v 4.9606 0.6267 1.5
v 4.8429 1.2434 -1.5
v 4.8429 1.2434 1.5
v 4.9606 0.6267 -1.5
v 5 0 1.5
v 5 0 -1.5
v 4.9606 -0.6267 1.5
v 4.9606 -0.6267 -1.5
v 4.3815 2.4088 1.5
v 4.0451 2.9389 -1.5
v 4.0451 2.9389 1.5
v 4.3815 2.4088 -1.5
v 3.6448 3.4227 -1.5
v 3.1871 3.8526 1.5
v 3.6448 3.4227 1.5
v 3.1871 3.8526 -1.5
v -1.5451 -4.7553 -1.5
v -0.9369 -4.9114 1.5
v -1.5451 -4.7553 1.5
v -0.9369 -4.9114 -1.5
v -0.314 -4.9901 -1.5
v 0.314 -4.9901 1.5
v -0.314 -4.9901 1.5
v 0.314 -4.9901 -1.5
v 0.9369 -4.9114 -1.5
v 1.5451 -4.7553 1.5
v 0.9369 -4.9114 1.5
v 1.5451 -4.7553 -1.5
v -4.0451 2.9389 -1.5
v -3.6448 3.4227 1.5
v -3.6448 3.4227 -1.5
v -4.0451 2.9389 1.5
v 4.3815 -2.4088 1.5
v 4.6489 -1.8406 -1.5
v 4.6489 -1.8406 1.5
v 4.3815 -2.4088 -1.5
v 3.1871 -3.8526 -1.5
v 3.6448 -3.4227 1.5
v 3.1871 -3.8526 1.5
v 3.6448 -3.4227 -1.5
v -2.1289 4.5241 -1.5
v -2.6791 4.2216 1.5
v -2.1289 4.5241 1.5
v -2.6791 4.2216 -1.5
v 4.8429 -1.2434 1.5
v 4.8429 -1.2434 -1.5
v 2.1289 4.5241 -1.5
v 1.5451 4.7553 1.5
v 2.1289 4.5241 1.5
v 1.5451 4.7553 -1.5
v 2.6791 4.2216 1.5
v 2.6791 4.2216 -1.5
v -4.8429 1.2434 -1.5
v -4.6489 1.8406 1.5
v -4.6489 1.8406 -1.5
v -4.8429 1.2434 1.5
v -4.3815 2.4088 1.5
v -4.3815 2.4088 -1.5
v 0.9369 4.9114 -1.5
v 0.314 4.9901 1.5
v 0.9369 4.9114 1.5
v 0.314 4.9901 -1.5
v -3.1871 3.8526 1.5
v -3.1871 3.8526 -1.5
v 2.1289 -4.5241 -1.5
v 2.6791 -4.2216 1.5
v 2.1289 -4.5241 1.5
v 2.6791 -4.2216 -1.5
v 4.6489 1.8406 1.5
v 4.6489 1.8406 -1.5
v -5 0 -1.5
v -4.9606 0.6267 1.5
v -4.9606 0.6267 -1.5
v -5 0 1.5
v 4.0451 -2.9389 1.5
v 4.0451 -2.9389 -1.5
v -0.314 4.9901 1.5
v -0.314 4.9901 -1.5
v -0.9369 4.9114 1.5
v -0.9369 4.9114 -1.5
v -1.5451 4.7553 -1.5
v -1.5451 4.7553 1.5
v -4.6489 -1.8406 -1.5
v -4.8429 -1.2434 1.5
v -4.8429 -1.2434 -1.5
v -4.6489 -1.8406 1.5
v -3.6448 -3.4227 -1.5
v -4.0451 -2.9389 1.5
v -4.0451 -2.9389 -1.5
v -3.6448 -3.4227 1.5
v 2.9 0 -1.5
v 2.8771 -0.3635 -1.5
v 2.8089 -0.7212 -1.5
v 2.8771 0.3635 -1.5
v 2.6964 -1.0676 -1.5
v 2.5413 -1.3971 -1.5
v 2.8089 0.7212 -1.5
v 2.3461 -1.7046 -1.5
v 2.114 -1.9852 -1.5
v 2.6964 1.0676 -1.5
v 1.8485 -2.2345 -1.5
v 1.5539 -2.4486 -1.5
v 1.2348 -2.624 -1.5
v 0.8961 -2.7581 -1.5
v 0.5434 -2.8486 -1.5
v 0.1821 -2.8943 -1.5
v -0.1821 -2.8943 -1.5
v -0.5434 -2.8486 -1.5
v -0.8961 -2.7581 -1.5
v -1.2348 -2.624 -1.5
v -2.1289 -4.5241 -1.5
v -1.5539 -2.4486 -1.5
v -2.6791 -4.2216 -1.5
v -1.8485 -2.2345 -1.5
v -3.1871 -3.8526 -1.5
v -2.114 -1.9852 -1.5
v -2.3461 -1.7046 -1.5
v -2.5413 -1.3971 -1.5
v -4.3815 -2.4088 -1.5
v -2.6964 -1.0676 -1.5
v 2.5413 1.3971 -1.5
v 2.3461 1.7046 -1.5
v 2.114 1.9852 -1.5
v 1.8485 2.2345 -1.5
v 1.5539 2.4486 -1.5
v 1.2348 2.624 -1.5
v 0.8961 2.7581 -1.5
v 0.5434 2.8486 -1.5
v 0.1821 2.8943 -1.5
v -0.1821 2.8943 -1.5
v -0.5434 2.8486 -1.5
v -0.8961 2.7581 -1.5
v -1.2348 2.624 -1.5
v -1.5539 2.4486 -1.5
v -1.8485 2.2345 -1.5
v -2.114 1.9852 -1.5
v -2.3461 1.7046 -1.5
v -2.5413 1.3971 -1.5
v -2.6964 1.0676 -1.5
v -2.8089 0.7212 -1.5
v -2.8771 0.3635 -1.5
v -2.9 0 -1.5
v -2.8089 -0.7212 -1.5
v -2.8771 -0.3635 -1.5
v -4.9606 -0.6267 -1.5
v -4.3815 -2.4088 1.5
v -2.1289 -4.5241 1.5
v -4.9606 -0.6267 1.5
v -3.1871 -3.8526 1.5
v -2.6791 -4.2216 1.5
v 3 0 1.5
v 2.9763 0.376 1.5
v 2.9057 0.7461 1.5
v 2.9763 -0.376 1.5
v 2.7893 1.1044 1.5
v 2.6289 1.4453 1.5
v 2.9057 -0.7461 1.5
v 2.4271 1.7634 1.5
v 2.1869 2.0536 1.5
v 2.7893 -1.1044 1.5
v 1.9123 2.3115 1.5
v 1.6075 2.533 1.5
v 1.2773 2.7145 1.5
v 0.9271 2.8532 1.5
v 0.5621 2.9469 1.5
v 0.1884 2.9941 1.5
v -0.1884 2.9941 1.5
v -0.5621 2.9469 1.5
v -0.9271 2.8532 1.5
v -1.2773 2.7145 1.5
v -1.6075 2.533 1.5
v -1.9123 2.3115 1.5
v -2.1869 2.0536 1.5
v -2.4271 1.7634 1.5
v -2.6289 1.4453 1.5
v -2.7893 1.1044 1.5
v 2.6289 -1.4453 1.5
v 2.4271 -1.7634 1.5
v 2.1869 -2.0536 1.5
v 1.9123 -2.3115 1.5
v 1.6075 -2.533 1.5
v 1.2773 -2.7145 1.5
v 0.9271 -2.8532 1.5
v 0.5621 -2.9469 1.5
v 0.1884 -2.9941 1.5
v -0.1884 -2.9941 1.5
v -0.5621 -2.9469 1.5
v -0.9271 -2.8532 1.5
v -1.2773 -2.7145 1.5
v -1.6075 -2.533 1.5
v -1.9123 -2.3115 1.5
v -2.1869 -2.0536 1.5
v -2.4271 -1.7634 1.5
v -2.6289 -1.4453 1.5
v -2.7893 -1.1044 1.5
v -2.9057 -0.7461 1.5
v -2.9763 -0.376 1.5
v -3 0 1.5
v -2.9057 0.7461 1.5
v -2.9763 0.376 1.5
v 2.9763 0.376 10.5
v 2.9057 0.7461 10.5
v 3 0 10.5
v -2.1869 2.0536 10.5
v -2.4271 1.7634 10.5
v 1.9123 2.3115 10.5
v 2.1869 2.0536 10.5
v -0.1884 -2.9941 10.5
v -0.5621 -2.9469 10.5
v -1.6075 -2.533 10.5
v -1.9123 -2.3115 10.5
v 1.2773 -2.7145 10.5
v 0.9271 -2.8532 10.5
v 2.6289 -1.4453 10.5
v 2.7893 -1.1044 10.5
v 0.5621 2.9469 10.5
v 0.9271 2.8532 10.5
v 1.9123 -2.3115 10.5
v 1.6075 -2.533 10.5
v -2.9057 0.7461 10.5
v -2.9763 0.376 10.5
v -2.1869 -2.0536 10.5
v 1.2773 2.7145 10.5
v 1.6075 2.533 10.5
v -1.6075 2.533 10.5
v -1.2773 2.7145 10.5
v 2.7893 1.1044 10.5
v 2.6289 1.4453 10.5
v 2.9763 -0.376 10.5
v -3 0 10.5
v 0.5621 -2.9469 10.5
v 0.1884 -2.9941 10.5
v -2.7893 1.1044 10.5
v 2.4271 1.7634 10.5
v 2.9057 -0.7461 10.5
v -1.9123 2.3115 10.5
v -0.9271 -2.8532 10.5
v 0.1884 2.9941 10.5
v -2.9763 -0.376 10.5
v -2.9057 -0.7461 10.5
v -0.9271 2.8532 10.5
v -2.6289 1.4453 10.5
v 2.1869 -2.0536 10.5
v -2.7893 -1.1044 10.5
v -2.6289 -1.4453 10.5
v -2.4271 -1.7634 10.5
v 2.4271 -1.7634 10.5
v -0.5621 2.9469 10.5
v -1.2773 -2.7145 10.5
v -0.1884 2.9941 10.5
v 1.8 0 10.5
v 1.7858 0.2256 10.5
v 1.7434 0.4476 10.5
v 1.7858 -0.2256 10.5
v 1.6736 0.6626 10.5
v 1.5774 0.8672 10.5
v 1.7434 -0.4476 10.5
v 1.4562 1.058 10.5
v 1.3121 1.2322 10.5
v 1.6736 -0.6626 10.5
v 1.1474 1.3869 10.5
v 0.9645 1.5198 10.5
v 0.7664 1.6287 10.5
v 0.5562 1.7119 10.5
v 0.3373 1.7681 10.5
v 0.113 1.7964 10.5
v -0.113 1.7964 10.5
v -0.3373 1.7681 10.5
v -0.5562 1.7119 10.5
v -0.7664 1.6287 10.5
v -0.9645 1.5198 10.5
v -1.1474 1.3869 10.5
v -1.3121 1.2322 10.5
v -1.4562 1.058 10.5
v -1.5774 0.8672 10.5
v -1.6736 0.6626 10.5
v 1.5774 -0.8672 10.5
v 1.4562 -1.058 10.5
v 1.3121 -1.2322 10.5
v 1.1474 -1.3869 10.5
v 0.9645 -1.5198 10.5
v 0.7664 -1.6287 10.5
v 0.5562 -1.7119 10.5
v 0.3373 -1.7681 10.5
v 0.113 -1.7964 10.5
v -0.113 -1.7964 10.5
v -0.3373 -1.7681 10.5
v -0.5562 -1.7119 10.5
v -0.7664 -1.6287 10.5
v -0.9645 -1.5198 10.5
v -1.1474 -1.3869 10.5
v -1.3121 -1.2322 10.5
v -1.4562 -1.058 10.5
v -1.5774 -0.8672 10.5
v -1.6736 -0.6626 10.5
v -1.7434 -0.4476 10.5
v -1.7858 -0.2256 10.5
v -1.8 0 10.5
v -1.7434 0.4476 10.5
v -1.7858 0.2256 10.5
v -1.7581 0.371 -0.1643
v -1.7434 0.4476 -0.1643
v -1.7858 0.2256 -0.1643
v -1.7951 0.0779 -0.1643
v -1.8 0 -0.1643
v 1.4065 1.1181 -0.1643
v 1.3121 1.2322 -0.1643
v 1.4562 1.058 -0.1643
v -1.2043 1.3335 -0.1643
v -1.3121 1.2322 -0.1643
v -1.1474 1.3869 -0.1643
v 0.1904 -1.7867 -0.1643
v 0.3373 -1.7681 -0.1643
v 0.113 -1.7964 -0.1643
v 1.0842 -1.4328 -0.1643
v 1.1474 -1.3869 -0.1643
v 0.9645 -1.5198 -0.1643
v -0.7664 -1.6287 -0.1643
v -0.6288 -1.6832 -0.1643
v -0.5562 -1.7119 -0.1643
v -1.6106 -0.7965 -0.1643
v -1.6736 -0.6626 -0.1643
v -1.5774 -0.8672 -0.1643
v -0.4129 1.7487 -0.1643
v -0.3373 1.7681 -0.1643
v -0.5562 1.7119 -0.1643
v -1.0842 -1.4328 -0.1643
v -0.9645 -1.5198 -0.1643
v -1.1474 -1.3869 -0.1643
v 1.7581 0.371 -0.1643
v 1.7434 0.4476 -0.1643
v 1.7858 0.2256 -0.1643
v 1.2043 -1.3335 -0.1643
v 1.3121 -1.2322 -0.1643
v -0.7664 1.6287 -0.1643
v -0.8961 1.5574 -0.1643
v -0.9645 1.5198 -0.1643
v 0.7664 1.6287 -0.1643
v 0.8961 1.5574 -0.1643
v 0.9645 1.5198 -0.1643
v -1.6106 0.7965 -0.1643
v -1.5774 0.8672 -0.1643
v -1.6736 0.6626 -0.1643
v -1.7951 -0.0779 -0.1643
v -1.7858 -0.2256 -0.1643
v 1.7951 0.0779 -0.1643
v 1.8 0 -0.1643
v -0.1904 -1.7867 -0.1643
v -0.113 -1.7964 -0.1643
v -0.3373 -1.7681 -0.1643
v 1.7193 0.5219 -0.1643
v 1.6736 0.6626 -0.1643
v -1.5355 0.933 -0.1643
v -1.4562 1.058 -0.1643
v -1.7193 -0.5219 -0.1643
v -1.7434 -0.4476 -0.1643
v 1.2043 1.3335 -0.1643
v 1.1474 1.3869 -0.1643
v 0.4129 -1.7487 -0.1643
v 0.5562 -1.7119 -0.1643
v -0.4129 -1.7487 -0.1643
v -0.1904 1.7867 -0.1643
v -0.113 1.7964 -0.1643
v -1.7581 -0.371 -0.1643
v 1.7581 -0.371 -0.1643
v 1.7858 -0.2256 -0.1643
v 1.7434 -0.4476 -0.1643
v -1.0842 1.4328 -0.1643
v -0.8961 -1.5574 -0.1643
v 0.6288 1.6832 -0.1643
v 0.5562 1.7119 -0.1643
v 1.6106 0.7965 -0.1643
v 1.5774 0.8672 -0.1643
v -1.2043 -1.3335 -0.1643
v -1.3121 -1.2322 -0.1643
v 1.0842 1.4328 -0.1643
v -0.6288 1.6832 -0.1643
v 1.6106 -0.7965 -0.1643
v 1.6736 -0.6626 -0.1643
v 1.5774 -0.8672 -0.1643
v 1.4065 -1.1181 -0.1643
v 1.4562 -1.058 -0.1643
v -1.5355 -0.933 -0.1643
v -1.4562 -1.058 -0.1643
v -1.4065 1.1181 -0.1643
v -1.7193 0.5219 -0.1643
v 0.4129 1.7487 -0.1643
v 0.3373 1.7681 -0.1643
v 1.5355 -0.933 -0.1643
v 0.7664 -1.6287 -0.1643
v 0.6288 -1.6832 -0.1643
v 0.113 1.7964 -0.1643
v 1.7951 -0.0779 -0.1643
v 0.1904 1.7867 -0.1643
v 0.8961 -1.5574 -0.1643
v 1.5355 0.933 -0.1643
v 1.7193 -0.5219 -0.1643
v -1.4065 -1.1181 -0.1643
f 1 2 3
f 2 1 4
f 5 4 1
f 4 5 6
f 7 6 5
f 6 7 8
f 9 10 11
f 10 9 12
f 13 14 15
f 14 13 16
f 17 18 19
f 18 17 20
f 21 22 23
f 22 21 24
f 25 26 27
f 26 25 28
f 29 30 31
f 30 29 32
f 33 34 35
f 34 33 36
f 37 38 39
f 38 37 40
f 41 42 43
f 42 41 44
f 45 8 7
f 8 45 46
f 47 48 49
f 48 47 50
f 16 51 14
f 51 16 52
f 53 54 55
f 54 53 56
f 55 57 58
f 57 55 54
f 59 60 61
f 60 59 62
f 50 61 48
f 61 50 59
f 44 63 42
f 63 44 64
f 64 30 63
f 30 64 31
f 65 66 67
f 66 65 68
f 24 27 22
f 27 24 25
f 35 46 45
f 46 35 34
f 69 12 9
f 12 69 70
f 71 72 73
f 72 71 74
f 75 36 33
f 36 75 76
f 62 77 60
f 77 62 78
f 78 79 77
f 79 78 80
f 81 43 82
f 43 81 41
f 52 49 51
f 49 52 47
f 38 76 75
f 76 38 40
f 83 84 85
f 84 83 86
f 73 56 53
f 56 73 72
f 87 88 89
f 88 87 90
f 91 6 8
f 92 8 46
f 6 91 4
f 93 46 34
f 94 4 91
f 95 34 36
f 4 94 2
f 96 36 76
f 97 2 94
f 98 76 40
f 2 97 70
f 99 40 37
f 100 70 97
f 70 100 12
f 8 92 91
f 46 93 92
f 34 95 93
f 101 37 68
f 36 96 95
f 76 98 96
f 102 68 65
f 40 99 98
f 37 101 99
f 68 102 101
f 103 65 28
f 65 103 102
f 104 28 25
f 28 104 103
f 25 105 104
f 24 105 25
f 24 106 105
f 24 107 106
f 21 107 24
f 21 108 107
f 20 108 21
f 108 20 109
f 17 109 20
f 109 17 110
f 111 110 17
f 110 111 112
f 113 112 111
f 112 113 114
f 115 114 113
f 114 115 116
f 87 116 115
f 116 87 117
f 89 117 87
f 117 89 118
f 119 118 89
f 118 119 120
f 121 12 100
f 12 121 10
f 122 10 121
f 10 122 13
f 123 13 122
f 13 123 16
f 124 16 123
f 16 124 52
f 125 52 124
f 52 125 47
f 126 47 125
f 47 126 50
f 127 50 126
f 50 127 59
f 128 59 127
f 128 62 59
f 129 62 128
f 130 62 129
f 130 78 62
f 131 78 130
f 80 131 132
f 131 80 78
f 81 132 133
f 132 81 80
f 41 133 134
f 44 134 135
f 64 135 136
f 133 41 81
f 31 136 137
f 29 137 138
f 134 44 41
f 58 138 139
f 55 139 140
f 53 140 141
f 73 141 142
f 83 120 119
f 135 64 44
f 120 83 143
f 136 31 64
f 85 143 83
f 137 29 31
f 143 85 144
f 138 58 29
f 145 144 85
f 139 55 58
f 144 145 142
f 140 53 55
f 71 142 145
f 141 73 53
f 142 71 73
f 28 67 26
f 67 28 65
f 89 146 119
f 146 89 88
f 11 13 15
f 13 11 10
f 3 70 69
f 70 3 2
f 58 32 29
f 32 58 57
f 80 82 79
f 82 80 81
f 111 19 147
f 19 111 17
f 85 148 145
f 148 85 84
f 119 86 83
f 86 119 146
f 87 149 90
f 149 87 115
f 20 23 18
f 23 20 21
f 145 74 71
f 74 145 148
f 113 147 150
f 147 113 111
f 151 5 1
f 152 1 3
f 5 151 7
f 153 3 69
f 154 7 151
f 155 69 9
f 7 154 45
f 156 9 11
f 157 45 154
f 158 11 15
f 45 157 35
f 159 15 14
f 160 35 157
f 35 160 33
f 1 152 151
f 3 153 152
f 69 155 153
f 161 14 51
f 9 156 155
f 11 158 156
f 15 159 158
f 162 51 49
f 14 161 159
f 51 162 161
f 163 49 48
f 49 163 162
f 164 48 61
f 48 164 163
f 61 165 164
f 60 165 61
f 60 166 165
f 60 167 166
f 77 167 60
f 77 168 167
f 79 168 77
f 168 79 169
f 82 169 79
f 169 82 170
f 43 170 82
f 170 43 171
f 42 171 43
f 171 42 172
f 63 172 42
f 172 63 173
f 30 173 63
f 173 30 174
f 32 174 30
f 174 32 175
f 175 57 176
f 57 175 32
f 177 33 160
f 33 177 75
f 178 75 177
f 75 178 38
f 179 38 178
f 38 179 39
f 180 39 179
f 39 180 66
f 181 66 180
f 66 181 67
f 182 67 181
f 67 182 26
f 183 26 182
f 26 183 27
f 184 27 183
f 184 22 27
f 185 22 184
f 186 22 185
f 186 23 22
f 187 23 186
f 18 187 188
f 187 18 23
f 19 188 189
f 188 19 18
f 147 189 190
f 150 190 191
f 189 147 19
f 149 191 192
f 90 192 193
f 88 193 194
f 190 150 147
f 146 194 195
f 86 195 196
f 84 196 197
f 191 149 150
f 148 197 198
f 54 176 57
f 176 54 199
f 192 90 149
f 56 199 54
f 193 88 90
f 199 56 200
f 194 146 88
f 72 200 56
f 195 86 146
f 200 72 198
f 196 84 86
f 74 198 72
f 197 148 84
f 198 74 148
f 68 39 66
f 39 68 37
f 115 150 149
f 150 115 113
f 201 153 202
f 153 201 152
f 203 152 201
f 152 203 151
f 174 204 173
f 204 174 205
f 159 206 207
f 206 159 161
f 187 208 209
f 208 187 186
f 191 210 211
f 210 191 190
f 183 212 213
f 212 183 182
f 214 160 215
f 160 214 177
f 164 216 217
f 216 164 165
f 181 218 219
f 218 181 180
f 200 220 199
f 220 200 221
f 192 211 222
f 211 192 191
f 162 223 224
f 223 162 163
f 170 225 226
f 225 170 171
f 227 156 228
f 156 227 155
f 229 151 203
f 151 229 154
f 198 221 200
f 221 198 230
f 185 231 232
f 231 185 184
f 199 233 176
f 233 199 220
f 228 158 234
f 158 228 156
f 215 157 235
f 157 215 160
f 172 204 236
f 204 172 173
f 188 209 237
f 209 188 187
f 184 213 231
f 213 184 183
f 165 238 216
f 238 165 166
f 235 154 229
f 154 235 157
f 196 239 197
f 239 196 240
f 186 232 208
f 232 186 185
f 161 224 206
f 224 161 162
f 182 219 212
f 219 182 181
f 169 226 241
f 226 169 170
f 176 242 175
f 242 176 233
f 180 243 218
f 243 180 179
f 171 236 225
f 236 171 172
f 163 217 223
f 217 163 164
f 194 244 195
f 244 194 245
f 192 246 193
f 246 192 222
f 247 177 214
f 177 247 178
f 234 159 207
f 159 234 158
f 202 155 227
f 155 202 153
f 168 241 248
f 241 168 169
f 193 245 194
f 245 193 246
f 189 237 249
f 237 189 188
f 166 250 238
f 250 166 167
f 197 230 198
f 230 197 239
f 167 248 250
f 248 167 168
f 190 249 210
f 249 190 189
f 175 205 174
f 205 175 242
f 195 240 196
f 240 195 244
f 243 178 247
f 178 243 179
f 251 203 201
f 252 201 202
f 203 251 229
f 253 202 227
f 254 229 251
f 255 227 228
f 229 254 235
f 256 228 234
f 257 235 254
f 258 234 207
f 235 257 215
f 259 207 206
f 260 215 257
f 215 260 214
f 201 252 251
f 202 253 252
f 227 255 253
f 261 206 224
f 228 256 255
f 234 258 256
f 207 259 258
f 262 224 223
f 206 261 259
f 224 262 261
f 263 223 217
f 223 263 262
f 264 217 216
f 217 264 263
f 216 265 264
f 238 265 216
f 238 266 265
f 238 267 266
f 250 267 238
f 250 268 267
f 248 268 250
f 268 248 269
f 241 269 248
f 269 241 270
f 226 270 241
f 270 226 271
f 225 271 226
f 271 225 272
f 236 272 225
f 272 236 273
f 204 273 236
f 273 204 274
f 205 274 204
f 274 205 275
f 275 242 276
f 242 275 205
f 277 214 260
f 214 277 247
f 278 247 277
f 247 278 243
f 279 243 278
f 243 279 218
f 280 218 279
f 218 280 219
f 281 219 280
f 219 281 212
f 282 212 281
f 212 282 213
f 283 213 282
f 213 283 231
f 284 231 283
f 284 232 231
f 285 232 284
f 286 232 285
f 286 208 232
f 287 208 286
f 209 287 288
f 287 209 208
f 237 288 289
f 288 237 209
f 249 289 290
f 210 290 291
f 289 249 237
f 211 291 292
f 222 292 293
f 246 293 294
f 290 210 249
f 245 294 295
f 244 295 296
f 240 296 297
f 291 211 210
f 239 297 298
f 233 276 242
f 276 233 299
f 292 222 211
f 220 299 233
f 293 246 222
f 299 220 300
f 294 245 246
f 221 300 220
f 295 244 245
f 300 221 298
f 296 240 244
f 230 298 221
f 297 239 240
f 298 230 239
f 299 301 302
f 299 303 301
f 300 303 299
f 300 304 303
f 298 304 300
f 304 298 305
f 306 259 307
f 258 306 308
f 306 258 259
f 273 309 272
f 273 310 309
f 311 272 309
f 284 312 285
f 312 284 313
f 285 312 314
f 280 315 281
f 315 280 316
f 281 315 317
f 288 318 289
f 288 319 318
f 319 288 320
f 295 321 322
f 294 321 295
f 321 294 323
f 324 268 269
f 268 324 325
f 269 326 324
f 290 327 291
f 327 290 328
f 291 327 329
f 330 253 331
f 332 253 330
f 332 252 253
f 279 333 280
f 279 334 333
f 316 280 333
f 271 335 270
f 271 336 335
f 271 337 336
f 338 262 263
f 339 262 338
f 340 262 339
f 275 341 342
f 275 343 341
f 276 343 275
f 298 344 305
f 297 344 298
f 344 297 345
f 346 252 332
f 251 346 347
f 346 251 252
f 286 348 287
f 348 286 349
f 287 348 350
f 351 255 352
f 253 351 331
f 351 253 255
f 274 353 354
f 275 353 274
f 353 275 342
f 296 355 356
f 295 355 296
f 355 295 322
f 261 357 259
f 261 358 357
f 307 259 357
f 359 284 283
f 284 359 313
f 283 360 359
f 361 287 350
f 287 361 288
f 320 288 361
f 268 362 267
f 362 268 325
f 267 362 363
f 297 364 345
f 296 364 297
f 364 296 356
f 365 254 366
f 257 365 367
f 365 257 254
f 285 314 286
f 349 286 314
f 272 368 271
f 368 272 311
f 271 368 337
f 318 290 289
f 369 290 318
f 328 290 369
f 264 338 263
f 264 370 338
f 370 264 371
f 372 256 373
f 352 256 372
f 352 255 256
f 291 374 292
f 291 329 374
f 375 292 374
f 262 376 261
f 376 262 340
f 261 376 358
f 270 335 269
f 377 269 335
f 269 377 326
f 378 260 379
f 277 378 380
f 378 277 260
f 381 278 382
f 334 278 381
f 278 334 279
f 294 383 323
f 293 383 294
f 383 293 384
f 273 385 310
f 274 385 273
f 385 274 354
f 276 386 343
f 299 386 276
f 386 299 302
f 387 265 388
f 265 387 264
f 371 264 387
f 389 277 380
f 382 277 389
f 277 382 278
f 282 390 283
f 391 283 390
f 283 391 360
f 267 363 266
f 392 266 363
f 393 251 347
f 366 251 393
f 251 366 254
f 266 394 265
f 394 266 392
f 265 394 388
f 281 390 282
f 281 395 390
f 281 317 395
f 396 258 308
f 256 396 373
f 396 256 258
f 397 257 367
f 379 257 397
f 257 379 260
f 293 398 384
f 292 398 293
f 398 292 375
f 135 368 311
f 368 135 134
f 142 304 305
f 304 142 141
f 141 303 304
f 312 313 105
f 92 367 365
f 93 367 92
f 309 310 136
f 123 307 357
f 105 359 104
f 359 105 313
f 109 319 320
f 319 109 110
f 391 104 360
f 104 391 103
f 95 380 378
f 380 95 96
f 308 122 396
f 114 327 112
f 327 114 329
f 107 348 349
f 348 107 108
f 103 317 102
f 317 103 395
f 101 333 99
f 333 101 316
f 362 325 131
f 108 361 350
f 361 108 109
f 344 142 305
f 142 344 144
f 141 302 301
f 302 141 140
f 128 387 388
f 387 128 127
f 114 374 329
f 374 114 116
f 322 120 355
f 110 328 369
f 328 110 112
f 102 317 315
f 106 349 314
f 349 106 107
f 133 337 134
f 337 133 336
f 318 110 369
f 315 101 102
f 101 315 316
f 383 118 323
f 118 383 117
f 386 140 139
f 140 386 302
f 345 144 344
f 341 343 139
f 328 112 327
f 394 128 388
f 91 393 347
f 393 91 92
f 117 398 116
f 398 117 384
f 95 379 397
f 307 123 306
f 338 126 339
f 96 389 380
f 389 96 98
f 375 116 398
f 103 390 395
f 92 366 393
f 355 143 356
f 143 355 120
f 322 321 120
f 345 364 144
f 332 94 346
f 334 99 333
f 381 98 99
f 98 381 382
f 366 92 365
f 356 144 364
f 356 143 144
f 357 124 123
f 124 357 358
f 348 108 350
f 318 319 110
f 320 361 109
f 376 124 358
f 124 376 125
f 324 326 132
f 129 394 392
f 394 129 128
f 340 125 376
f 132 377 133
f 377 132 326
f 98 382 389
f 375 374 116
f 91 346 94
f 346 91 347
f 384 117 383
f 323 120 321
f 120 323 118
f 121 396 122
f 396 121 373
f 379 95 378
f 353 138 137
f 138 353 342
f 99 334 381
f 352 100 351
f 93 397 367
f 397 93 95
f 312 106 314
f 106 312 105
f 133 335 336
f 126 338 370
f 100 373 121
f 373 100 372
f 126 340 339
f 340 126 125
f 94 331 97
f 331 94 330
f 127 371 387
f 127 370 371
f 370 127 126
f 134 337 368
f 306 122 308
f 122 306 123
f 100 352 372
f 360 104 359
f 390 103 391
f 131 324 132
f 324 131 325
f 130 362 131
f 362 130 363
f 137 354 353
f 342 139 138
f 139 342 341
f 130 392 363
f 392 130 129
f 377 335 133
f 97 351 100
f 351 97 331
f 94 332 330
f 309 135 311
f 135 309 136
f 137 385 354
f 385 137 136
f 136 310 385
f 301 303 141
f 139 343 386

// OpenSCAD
$fn = 50;


difference() {
	union() {
		translate(v = [0, 0, -1.5000000000]) {
			cylinder(h = 3, r = 5.0000000000);
		}
		translate(v = [0, 0, -1.5000000000]) {
			cylinder(h = 12, r = 3.0000000000);
		}
	}
	union() {
		translate(v = [0, 0, -1.5000000000]) {
			rotate(a = [0, 180, 0]) {
				difference() {
					union() {
						translate(v = [0, 0, -12.0000000000]) {
							cylinder(h = 12, r = 1.5000000000);
						}
						translate(v = [0, 0, -12.0000000000]) {
							cylinder(h = 12, r = 1.8000000000);
						}
						translate(v = [0, 0, -1.7000000000]) {
							cylinder(h = 1.7000000000, r1 = 1.5000000000, r2 = 2.9000000000);
						}
						translate(v = [0, 0, -12.0000000000]) {
							cylinder(h = 12, r = 1.5000000000);
						}
					}
					union();
				}
			}
		}
		translate(v = [0, 0, -50.0000000000]) {
			cylinder(h = 100, r = 1.5000000000);
		}
	}
}
